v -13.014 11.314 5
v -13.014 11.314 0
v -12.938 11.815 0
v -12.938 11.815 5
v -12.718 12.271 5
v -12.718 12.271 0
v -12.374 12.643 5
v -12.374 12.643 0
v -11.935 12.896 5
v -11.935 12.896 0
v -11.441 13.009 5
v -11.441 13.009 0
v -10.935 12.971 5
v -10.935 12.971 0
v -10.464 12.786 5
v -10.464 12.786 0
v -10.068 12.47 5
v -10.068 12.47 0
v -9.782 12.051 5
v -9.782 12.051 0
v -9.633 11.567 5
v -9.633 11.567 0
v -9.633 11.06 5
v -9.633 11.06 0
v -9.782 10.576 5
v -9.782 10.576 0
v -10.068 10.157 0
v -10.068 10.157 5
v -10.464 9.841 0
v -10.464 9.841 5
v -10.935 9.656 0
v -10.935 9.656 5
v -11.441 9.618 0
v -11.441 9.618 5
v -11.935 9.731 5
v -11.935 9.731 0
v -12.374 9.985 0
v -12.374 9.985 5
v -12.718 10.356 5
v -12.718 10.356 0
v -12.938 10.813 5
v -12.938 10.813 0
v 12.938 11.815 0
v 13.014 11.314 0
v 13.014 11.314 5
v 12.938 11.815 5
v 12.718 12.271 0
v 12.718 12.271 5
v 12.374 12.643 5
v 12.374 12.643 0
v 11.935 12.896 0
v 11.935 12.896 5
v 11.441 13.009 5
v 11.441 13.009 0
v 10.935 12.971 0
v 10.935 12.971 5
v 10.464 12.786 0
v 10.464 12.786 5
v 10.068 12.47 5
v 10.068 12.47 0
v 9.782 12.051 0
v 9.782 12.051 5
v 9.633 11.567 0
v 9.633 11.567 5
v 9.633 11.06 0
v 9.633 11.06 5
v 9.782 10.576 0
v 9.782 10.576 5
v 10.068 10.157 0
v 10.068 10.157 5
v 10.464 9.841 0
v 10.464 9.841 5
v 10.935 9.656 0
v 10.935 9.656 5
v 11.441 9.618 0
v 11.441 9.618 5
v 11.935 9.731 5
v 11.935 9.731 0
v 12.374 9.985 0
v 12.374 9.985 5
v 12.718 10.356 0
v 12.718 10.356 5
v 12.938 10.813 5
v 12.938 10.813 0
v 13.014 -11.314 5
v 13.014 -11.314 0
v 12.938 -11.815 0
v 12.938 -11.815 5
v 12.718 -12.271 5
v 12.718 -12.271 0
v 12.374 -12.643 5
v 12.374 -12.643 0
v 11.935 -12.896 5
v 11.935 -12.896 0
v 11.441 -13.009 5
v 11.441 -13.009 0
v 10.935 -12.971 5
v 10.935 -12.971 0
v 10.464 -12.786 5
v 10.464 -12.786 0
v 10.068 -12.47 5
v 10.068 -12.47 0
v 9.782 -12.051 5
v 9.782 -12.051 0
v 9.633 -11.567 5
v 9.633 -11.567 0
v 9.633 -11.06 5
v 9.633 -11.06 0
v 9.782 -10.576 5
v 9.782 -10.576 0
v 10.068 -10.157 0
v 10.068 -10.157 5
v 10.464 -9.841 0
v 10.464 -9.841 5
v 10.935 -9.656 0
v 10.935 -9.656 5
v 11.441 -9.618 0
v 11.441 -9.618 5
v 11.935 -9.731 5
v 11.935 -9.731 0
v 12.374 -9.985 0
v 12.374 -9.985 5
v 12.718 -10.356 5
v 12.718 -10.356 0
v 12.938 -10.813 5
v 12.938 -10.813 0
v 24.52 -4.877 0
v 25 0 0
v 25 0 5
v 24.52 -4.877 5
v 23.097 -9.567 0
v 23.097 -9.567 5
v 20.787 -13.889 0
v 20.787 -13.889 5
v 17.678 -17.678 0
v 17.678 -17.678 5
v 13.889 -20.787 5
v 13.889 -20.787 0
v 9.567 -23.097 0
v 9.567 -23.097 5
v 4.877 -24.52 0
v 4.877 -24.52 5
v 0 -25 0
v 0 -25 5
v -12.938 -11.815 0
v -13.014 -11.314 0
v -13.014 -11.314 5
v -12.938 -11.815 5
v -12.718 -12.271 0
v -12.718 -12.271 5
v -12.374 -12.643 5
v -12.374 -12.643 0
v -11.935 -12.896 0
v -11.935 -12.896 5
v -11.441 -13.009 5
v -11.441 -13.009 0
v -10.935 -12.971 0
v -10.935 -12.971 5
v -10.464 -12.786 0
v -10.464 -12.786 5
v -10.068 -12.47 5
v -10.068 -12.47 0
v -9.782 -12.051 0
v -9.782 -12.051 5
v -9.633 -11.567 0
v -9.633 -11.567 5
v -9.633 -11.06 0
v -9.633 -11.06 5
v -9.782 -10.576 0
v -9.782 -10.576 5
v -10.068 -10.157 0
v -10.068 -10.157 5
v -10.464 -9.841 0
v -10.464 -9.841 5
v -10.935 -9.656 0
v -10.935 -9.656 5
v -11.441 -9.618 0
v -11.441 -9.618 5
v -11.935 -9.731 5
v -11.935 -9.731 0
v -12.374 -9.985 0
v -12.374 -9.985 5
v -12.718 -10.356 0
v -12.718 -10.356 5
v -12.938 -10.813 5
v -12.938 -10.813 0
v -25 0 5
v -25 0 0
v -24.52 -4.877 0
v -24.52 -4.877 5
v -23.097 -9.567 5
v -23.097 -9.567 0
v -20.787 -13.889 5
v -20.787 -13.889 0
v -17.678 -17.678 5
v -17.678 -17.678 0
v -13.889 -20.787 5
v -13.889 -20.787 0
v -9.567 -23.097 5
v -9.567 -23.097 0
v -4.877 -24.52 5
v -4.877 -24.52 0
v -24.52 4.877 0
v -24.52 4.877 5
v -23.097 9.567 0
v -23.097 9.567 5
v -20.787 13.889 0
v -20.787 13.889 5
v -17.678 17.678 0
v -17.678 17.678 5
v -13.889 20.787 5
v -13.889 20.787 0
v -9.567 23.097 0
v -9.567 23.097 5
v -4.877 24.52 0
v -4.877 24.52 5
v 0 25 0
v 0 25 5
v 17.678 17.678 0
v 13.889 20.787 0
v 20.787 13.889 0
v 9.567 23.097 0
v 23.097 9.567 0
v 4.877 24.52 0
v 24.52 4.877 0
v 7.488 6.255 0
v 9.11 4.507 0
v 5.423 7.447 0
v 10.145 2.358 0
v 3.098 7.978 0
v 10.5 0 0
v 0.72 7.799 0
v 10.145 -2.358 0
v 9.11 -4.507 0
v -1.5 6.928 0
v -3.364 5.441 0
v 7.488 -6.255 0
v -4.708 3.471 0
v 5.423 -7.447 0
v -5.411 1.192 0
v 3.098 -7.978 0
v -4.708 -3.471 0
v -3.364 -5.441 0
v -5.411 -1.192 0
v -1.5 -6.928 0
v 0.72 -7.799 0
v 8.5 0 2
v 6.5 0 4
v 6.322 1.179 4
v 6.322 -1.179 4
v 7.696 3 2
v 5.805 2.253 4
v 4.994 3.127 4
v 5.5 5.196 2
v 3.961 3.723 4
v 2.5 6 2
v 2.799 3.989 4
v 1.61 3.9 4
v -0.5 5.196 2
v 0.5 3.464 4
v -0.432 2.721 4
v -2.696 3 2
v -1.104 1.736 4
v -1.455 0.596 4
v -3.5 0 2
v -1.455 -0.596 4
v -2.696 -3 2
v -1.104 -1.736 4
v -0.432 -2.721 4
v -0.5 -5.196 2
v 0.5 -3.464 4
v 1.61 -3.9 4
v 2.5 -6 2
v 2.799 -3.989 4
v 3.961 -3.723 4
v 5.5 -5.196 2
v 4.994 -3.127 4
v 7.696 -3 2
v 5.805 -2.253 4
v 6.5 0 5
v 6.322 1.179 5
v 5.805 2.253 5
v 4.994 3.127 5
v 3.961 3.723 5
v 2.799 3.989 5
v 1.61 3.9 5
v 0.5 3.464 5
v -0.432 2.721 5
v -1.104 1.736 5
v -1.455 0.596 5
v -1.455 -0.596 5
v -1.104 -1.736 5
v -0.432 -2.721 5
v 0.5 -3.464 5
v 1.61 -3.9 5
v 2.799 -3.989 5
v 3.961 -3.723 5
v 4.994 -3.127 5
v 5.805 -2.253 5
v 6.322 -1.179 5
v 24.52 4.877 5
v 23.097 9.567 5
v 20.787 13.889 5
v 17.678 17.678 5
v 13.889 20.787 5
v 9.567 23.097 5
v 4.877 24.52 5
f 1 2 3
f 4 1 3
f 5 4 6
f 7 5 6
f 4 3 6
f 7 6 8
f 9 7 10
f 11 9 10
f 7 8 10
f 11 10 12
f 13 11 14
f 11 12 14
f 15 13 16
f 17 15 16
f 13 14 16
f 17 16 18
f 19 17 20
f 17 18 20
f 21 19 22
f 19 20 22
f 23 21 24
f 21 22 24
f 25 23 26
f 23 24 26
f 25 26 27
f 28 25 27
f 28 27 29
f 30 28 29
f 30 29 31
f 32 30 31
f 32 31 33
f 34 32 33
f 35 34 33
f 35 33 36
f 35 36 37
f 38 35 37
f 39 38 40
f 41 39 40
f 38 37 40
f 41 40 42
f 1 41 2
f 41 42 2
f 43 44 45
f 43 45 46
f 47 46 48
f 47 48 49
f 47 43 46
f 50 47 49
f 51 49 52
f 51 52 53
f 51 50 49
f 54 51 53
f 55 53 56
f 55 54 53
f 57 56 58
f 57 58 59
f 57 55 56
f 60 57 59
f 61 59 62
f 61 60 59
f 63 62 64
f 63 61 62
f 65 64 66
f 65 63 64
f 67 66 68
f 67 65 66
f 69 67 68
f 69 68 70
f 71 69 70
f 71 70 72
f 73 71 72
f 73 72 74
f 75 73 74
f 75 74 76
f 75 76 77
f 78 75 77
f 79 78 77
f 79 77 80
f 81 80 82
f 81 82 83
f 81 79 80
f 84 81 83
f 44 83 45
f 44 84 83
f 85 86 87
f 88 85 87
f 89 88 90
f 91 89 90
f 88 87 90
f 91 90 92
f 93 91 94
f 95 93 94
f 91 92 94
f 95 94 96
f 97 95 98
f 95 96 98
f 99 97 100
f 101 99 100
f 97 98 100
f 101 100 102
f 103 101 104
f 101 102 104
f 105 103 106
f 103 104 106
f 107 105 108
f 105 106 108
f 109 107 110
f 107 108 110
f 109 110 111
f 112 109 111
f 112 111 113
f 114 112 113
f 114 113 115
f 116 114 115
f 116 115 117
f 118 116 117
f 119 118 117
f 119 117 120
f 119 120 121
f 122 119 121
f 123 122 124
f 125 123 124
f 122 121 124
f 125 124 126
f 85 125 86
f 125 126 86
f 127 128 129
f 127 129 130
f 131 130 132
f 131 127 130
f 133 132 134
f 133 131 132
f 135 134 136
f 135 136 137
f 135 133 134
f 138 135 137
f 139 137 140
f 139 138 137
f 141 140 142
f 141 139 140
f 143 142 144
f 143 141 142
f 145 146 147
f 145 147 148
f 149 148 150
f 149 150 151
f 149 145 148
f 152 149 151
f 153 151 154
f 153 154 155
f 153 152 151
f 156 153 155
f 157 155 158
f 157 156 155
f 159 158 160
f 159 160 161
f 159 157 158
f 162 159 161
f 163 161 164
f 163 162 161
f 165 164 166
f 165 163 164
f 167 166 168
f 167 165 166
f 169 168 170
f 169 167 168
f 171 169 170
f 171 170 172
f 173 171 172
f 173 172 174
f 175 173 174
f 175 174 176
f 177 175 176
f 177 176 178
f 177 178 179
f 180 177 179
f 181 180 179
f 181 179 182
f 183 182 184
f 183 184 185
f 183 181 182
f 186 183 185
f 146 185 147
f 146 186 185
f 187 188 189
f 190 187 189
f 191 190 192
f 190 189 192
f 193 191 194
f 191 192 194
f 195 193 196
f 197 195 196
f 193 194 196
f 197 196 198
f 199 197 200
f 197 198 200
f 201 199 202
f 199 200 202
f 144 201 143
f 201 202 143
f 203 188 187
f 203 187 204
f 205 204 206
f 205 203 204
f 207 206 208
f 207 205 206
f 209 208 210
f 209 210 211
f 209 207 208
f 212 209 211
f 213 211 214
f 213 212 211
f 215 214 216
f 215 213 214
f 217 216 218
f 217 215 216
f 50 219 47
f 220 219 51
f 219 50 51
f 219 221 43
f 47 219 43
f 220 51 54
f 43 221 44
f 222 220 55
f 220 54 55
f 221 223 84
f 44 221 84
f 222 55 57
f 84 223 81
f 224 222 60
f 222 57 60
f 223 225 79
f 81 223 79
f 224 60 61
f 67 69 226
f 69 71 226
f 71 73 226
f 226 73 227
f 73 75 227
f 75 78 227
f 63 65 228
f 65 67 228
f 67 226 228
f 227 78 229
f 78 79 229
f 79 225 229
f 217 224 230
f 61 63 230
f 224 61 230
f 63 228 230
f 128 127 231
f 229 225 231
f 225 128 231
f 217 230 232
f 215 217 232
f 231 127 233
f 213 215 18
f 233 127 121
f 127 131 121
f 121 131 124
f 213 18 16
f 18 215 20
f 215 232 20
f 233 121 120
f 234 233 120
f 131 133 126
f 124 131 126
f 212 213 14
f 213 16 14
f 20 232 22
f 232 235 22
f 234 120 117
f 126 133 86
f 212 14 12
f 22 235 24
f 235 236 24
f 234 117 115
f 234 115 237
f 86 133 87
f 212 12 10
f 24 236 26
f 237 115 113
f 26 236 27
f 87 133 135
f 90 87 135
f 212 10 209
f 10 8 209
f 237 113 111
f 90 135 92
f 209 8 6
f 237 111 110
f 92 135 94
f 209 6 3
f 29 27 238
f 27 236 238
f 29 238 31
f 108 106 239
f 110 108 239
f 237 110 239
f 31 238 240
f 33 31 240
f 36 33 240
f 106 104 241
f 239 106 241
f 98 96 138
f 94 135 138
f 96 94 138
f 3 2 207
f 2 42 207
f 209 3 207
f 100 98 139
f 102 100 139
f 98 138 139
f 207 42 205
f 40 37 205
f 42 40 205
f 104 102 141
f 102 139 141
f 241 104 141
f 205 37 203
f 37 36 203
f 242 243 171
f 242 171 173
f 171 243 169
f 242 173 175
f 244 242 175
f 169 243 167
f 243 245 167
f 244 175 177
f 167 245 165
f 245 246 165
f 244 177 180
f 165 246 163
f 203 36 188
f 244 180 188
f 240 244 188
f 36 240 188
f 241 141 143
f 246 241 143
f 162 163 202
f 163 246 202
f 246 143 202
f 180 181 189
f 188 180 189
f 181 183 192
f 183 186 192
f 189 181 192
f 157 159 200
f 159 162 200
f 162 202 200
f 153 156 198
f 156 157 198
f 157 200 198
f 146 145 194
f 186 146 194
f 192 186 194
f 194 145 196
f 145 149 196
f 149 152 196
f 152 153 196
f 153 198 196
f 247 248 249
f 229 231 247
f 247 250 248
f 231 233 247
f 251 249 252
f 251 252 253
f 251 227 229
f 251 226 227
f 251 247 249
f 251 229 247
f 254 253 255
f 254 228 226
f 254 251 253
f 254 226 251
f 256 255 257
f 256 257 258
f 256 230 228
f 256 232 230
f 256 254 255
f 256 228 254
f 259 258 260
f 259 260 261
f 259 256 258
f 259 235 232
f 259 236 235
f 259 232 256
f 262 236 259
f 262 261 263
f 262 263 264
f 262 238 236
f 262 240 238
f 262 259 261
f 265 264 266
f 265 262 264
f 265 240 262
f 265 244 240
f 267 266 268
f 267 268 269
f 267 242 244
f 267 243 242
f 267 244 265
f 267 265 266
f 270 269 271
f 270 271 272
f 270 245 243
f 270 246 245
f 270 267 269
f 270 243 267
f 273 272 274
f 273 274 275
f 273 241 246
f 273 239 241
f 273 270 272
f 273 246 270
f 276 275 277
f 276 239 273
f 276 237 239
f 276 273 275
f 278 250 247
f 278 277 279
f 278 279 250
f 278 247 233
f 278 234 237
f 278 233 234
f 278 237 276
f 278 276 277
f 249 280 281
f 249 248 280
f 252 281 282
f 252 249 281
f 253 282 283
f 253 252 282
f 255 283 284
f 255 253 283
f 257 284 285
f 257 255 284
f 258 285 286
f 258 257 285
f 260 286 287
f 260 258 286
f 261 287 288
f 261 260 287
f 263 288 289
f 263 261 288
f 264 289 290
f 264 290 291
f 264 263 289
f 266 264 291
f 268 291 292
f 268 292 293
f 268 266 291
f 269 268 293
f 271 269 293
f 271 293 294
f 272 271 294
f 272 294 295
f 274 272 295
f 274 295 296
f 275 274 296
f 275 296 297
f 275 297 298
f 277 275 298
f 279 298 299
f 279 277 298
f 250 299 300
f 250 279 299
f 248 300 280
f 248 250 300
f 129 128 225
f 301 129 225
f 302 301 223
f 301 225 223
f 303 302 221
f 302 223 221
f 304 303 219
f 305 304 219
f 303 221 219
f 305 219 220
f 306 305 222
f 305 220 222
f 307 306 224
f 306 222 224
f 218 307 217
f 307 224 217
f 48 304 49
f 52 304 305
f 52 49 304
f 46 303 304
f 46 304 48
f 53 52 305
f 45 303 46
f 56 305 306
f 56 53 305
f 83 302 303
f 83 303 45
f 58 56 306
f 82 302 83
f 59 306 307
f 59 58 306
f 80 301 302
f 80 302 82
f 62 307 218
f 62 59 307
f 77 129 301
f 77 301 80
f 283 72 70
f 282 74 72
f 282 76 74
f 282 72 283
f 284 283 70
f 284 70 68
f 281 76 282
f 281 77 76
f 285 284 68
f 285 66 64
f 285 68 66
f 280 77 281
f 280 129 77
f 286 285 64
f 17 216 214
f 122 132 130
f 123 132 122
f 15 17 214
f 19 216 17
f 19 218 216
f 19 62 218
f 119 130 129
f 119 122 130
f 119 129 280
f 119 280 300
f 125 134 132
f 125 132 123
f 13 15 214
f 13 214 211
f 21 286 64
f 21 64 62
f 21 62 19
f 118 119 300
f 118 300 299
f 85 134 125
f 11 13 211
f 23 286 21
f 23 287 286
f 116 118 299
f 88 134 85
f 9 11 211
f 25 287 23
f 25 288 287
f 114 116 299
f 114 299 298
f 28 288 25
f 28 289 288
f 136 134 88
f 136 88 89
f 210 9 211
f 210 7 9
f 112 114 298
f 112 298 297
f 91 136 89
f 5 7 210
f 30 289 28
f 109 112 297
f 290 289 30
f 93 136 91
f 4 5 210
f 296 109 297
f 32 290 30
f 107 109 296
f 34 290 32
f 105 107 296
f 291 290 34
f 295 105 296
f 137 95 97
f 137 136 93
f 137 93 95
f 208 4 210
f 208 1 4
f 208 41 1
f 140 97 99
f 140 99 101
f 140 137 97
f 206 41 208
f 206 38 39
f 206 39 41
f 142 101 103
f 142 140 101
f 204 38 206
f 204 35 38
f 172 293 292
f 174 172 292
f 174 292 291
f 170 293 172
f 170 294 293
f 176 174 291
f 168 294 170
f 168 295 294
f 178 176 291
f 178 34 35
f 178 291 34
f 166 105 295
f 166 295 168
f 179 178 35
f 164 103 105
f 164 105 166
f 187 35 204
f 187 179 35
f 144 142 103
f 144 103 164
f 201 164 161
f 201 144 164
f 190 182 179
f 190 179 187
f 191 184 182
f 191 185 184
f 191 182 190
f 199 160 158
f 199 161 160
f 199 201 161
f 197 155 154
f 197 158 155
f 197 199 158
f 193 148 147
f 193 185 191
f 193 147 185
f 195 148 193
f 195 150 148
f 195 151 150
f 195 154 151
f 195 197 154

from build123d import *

# Parameters (mm, degrees)
SKETCH_R             = 1.7
PAD_DEPTH            = 5
SKETCH_MIRRORED_2_R  = 1.7
PAD_MIRRORED_2_DEPTH = 5


with BuildPart() as part:
    # Sketch → Pad (new body)
    with BuildSketch(Plane.XY):
        with BuildLine():
            ThreePointArc((25, 0), (17.67767, 17.67767), (0, 25))
            Line((0, 25), (0, 0))
            Line((0, 0), (25, 0))
        make_face()
        with Locations((11.313708, 11.313708)):
            Circle(SKETCH_R, mode=Mode.SUBTRACT)
    pad = extrude(amount=PAD_DEPTH)

    # Sketch Mirrored 2 → Pad Mirrored 2 (add)
    with BuildSketch(Plane(origin=(0, 0, 0), x_dir=(-1, 0, 0), z_dir=(0, 0, -1))):
        with BuildLine():
            ThreePointArc((25, 0), (17.67767, 17.67767), (0, 25))
            Line((0, 25), (0, 0))
            Line((0, 0), (25, 0))
        make_face()
        with Locations((11.313708, 11.313708)):
            Circle(SKETCH_MIRRORED_2_R, mode=Mode.SUBTRACT)
    pad_mirrored_2 = extrude(amount=-PAD_MIRRORED_2_DEPTH)

    # Mirrored001: Pad, Pad Mirrored 2 across Sketch H_Axis
    add(pad.mirror(Plane.ZX))
    add(pad_mirrored_2.mirror(Plane.ZX))

    # Sketch001 → Groove (revolve, cut)
    with BuildSketch(Plane(origin=(2.5, 0, 0), x_dir=(1, 0, 0), z_dir=(0, -1, 0))):
        Polygon((0, 5), (4, 5), (4, 4), (8, 0), (0, 0), align=None)
    revolve(axis=Axis((2.5, 0, 0), (0, 0, 1)), mode=Mode.SUBTRACT)


solid = part.part
